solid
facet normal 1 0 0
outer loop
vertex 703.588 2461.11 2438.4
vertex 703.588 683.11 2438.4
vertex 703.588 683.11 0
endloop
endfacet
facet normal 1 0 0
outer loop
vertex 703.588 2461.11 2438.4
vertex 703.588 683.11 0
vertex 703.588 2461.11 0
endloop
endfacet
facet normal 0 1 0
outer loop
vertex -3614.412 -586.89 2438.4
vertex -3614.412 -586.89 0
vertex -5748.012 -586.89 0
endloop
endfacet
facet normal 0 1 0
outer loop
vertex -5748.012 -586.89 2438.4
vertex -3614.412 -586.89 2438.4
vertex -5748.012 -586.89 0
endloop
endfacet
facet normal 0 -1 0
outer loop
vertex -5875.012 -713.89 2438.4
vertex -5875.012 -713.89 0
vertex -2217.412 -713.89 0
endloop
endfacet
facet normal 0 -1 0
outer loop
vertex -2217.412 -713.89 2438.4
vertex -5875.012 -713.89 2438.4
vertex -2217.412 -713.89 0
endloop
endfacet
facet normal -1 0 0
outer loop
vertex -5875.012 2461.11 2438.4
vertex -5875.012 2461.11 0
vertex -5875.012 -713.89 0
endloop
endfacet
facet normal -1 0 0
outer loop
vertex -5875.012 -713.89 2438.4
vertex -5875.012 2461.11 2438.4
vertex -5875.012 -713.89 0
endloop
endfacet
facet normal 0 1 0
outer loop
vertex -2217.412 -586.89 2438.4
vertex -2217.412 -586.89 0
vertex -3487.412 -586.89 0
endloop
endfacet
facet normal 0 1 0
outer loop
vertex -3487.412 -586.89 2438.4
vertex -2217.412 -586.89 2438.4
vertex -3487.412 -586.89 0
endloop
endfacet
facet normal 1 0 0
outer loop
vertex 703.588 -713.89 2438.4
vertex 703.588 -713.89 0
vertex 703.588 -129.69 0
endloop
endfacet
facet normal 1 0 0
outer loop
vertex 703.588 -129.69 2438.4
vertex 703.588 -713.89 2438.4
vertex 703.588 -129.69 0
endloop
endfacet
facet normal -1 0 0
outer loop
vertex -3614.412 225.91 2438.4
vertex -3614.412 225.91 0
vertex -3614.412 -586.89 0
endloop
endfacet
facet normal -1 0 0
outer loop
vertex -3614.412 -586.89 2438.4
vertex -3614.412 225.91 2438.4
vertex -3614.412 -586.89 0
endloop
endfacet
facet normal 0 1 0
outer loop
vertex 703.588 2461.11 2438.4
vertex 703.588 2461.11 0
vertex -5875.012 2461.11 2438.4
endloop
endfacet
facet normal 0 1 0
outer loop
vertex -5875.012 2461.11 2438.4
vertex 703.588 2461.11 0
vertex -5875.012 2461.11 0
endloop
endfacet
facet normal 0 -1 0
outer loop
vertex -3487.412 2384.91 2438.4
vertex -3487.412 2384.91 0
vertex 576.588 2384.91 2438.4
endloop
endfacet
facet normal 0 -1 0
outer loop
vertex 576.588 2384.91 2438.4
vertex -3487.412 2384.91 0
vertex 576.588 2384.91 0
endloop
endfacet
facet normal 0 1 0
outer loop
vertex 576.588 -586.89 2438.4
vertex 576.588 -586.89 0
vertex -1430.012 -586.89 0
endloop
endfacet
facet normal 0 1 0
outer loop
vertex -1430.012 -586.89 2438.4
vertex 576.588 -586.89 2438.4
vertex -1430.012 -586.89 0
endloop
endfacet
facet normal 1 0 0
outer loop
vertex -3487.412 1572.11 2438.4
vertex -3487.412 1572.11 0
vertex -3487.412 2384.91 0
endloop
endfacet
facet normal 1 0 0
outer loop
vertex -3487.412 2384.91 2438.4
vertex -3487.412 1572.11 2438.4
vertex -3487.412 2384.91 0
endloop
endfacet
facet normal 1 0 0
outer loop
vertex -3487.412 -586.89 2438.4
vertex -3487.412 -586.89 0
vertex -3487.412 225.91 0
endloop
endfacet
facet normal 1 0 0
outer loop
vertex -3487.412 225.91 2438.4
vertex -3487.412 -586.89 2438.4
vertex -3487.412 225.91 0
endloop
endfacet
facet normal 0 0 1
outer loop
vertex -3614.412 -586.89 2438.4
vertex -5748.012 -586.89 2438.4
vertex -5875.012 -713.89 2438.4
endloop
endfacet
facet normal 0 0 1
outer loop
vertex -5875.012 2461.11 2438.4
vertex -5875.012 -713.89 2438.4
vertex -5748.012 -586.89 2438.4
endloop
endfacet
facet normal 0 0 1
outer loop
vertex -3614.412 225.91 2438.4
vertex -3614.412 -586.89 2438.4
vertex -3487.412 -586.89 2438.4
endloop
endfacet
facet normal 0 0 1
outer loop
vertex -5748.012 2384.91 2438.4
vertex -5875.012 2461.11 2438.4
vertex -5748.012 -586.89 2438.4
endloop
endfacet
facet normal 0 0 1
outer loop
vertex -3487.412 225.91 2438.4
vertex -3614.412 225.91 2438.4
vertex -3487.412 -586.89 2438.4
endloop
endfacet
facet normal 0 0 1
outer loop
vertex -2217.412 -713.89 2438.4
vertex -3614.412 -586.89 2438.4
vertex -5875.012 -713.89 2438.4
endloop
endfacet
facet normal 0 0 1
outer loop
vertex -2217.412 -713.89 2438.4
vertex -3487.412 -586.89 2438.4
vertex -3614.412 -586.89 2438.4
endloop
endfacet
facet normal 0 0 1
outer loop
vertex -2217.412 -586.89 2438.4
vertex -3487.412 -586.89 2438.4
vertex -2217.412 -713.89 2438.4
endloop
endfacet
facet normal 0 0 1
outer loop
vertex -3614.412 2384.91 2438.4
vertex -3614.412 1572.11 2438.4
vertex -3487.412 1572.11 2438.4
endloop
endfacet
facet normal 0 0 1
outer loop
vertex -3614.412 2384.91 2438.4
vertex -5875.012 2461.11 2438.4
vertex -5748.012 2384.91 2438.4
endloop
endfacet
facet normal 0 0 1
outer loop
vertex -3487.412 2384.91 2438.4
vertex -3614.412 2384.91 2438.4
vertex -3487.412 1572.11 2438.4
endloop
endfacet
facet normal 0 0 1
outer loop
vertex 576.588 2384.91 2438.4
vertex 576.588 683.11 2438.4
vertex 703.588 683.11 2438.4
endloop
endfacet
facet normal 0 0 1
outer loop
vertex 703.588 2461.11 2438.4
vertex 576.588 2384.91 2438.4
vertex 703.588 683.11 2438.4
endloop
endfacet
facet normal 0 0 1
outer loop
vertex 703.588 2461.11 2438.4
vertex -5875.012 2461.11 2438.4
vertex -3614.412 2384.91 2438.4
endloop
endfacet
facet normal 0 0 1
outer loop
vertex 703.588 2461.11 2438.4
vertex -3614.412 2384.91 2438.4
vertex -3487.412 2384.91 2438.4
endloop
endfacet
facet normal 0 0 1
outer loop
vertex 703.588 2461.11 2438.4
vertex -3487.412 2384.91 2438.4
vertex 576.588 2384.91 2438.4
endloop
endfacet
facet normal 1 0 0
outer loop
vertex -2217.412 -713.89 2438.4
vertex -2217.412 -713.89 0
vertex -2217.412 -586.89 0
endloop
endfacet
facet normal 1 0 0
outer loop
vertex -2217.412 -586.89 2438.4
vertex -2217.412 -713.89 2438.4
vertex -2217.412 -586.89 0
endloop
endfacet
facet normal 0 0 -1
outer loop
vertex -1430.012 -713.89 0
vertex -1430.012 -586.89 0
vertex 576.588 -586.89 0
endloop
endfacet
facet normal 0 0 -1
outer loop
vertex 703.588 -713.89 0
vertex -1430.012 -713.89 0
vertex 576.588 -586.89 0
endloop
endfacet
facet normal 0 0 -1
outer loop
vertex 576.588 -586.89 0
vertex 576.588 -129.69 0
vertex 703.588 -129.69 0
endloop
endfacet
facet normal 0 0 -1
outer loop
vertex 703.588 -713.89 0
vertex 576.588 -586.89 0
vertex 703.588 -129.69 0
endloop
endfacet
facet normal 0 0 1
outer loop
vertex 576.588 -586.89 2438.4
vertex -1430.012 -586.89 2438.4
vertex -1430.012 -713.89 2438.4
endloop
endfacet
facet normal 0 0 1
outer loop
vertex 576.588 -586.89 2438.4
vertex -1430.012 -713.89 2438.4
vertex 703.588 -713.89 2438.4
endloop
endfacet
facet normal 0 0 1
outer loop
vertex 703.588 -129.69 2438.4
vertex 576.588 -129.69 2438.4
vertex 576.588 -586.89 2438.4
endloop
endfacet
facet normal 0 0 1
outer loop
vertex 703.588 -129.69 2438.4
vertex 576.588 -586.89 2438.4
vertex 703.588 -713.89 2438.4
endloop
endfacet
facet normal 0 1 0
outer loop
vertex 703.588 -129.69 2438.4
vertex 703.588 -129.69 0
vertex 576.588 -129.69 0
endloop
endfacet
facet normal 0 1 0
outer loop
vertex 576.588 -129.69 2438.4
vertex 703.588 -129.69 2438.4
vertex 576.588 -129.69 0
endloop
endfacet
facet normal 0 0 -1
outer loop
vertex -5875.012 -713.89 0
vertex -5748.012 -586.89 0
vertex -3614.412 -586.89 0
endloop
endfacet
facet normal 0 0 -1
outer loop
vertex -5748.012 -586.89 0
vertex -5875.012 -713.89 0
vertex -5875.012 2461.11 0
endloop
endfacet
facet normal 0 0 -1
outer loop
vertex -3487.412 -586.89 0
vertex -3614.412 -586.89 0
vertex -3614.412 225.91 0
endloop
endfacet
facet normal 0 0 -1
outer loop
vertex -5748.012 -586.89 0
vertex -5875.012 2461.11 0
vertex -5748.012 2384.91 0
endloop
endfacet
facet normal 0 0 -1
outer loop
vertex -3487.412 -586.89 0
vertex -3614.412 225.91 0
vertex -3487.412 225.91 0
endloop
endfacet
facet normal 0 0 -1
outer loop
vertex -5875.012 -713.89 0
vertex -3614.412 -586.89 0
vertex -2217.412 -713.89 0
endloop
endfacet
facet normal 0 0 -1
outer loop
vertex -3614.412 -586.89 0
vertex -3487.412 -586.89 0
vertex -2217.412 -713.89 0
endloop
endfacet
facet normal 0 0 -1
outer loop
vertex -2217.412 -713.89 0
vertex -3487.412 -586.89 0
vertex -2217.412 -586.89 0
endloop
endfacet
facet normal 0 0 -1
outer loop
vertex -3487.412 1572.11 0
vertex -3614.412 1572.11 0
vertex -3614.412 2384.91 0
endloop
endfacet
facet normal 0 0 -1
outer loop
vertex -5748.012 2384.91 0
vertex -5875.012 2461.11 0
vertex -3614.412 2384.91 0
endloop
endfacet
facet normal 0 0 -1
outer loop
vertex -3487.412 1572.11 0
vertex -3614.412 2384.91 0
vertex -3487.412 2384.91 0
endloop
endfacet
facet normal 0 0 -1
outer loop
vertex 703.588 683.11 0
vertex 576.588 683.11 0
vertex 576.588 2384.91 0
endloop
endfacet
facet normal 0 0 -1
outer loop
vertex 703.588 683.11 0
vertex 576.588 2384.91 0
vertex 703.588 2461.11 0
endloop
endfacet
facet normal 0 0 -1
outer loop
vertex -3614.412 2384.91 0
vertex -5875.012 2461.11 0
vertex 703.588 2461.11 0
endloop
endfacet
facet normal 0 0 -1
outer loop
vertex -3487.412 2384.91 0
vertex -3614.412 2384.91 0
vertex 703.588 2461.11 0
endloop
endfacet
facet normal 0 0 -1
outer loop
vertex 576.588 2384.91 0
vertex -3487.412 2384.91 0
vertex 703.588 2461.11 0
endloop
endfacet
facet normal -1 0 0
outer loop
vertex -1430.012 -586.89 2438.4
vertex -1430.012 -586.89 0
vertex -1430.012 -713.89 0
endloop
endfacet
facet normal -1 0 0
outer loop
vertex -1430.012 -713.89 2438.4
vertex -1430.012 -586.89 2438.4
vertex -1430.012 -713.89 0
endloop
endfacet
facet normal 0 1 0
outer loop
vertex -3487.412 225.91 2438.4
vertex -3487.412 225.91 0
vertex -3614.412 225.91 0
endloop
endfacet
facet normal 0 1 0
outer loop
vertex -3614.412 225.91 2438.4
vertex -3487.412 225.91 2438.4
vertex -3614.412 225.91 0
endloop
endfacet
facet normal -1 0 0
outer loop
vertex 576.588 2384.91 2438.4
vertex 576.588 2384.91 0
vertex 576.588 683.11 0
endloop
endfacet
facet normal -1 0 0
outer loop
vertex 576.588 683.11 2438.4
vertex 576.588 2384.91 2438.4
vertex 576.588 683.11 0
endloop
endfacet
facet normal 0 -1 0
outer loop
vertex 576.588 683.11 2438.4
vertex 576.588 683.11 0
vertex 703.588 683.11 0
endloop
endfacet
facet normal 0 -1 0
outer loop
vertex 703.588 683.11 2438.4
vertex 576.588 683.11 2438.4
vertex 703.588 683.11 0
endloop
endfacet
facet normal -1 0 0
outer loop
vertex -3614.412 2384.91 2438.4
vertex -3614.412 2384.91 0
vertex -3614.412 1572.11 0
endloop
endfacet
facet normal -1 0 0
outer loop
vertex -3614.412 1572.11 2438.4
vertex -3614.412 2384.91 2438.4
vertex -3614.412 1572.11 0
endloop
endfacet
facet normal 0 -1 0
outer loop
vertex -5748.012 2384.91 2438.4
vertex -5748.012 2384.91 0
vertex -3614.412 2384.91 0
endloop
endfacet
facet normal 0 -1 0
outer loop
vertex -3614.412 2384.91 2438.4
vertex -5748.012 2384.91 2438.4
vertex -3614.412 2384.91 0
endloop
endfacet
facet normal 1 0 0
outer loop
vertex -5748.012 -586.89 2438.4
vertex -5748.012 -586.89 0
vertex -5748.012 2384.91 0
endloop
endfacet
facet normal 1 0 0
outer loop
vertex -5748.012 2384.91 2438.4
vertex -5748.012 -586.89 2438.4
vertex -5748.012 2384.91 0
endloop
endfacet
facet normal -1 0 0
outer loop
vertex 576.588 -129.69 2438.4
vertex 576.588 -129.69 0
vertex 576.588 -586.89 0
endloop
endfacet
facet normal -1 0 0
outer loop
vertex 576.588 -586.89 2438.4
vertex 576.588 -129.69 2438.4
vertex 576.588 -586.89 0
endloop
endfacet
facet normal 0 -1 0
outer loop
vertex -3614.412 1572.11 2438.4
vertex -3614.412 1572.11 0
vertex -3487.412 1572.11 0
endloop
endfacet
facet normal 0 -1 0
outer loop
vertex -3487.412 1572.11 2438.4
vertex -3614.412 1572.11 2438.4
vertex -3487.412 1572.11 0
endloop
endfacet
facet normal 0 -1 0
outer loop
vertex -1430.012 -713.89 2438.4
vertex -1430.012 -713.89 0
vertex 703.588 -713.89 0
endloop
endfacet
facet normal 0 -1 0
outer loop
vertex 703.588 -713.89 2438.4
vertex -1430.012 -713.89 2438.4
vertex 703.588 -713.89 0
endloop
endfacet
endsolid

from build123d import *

# Parameters (mm, degrees)
F1_DEPTH = 2438.4


with BuildPart() as f1:
    # F0 (on Top) → F1 (new body)
    with BuildSketch(Plane.XY):
        Polygon((-2217.411592, -586.890213), (-3487.411592, -586.890213), (-3487.411592, 225.909787), (-3614.411592, 225.909787), (-3614.411592, -586.890213), (-5748.011592, -586.890213), (-5748.011592, 2384.909787), (-3614.411592, 2384.909787), (-3614.411592, 1572.109787), (-3487.411592, 1572.109787), (-3487.411592, 2384.909787), (576.588408, 2384.909787), (576.588408, 683.109787), (703.588408, 683.109787), (703.588408, 2461.109787), (-5875.011592, 2461.109787), (-5875.011592, -713.890213), (-2217.411592, -713.890213), align=None)
        Polygon((-1430.011592, -586.890213), (-1430.011592, -713.890213), (703.588408, -713.890213), (703.588408, -129.690213), (576.588408, -129.690213), (576.588408, -586.890213), align=None)
    extrude(amount=F1_DEPTH)


solid = f1.part
